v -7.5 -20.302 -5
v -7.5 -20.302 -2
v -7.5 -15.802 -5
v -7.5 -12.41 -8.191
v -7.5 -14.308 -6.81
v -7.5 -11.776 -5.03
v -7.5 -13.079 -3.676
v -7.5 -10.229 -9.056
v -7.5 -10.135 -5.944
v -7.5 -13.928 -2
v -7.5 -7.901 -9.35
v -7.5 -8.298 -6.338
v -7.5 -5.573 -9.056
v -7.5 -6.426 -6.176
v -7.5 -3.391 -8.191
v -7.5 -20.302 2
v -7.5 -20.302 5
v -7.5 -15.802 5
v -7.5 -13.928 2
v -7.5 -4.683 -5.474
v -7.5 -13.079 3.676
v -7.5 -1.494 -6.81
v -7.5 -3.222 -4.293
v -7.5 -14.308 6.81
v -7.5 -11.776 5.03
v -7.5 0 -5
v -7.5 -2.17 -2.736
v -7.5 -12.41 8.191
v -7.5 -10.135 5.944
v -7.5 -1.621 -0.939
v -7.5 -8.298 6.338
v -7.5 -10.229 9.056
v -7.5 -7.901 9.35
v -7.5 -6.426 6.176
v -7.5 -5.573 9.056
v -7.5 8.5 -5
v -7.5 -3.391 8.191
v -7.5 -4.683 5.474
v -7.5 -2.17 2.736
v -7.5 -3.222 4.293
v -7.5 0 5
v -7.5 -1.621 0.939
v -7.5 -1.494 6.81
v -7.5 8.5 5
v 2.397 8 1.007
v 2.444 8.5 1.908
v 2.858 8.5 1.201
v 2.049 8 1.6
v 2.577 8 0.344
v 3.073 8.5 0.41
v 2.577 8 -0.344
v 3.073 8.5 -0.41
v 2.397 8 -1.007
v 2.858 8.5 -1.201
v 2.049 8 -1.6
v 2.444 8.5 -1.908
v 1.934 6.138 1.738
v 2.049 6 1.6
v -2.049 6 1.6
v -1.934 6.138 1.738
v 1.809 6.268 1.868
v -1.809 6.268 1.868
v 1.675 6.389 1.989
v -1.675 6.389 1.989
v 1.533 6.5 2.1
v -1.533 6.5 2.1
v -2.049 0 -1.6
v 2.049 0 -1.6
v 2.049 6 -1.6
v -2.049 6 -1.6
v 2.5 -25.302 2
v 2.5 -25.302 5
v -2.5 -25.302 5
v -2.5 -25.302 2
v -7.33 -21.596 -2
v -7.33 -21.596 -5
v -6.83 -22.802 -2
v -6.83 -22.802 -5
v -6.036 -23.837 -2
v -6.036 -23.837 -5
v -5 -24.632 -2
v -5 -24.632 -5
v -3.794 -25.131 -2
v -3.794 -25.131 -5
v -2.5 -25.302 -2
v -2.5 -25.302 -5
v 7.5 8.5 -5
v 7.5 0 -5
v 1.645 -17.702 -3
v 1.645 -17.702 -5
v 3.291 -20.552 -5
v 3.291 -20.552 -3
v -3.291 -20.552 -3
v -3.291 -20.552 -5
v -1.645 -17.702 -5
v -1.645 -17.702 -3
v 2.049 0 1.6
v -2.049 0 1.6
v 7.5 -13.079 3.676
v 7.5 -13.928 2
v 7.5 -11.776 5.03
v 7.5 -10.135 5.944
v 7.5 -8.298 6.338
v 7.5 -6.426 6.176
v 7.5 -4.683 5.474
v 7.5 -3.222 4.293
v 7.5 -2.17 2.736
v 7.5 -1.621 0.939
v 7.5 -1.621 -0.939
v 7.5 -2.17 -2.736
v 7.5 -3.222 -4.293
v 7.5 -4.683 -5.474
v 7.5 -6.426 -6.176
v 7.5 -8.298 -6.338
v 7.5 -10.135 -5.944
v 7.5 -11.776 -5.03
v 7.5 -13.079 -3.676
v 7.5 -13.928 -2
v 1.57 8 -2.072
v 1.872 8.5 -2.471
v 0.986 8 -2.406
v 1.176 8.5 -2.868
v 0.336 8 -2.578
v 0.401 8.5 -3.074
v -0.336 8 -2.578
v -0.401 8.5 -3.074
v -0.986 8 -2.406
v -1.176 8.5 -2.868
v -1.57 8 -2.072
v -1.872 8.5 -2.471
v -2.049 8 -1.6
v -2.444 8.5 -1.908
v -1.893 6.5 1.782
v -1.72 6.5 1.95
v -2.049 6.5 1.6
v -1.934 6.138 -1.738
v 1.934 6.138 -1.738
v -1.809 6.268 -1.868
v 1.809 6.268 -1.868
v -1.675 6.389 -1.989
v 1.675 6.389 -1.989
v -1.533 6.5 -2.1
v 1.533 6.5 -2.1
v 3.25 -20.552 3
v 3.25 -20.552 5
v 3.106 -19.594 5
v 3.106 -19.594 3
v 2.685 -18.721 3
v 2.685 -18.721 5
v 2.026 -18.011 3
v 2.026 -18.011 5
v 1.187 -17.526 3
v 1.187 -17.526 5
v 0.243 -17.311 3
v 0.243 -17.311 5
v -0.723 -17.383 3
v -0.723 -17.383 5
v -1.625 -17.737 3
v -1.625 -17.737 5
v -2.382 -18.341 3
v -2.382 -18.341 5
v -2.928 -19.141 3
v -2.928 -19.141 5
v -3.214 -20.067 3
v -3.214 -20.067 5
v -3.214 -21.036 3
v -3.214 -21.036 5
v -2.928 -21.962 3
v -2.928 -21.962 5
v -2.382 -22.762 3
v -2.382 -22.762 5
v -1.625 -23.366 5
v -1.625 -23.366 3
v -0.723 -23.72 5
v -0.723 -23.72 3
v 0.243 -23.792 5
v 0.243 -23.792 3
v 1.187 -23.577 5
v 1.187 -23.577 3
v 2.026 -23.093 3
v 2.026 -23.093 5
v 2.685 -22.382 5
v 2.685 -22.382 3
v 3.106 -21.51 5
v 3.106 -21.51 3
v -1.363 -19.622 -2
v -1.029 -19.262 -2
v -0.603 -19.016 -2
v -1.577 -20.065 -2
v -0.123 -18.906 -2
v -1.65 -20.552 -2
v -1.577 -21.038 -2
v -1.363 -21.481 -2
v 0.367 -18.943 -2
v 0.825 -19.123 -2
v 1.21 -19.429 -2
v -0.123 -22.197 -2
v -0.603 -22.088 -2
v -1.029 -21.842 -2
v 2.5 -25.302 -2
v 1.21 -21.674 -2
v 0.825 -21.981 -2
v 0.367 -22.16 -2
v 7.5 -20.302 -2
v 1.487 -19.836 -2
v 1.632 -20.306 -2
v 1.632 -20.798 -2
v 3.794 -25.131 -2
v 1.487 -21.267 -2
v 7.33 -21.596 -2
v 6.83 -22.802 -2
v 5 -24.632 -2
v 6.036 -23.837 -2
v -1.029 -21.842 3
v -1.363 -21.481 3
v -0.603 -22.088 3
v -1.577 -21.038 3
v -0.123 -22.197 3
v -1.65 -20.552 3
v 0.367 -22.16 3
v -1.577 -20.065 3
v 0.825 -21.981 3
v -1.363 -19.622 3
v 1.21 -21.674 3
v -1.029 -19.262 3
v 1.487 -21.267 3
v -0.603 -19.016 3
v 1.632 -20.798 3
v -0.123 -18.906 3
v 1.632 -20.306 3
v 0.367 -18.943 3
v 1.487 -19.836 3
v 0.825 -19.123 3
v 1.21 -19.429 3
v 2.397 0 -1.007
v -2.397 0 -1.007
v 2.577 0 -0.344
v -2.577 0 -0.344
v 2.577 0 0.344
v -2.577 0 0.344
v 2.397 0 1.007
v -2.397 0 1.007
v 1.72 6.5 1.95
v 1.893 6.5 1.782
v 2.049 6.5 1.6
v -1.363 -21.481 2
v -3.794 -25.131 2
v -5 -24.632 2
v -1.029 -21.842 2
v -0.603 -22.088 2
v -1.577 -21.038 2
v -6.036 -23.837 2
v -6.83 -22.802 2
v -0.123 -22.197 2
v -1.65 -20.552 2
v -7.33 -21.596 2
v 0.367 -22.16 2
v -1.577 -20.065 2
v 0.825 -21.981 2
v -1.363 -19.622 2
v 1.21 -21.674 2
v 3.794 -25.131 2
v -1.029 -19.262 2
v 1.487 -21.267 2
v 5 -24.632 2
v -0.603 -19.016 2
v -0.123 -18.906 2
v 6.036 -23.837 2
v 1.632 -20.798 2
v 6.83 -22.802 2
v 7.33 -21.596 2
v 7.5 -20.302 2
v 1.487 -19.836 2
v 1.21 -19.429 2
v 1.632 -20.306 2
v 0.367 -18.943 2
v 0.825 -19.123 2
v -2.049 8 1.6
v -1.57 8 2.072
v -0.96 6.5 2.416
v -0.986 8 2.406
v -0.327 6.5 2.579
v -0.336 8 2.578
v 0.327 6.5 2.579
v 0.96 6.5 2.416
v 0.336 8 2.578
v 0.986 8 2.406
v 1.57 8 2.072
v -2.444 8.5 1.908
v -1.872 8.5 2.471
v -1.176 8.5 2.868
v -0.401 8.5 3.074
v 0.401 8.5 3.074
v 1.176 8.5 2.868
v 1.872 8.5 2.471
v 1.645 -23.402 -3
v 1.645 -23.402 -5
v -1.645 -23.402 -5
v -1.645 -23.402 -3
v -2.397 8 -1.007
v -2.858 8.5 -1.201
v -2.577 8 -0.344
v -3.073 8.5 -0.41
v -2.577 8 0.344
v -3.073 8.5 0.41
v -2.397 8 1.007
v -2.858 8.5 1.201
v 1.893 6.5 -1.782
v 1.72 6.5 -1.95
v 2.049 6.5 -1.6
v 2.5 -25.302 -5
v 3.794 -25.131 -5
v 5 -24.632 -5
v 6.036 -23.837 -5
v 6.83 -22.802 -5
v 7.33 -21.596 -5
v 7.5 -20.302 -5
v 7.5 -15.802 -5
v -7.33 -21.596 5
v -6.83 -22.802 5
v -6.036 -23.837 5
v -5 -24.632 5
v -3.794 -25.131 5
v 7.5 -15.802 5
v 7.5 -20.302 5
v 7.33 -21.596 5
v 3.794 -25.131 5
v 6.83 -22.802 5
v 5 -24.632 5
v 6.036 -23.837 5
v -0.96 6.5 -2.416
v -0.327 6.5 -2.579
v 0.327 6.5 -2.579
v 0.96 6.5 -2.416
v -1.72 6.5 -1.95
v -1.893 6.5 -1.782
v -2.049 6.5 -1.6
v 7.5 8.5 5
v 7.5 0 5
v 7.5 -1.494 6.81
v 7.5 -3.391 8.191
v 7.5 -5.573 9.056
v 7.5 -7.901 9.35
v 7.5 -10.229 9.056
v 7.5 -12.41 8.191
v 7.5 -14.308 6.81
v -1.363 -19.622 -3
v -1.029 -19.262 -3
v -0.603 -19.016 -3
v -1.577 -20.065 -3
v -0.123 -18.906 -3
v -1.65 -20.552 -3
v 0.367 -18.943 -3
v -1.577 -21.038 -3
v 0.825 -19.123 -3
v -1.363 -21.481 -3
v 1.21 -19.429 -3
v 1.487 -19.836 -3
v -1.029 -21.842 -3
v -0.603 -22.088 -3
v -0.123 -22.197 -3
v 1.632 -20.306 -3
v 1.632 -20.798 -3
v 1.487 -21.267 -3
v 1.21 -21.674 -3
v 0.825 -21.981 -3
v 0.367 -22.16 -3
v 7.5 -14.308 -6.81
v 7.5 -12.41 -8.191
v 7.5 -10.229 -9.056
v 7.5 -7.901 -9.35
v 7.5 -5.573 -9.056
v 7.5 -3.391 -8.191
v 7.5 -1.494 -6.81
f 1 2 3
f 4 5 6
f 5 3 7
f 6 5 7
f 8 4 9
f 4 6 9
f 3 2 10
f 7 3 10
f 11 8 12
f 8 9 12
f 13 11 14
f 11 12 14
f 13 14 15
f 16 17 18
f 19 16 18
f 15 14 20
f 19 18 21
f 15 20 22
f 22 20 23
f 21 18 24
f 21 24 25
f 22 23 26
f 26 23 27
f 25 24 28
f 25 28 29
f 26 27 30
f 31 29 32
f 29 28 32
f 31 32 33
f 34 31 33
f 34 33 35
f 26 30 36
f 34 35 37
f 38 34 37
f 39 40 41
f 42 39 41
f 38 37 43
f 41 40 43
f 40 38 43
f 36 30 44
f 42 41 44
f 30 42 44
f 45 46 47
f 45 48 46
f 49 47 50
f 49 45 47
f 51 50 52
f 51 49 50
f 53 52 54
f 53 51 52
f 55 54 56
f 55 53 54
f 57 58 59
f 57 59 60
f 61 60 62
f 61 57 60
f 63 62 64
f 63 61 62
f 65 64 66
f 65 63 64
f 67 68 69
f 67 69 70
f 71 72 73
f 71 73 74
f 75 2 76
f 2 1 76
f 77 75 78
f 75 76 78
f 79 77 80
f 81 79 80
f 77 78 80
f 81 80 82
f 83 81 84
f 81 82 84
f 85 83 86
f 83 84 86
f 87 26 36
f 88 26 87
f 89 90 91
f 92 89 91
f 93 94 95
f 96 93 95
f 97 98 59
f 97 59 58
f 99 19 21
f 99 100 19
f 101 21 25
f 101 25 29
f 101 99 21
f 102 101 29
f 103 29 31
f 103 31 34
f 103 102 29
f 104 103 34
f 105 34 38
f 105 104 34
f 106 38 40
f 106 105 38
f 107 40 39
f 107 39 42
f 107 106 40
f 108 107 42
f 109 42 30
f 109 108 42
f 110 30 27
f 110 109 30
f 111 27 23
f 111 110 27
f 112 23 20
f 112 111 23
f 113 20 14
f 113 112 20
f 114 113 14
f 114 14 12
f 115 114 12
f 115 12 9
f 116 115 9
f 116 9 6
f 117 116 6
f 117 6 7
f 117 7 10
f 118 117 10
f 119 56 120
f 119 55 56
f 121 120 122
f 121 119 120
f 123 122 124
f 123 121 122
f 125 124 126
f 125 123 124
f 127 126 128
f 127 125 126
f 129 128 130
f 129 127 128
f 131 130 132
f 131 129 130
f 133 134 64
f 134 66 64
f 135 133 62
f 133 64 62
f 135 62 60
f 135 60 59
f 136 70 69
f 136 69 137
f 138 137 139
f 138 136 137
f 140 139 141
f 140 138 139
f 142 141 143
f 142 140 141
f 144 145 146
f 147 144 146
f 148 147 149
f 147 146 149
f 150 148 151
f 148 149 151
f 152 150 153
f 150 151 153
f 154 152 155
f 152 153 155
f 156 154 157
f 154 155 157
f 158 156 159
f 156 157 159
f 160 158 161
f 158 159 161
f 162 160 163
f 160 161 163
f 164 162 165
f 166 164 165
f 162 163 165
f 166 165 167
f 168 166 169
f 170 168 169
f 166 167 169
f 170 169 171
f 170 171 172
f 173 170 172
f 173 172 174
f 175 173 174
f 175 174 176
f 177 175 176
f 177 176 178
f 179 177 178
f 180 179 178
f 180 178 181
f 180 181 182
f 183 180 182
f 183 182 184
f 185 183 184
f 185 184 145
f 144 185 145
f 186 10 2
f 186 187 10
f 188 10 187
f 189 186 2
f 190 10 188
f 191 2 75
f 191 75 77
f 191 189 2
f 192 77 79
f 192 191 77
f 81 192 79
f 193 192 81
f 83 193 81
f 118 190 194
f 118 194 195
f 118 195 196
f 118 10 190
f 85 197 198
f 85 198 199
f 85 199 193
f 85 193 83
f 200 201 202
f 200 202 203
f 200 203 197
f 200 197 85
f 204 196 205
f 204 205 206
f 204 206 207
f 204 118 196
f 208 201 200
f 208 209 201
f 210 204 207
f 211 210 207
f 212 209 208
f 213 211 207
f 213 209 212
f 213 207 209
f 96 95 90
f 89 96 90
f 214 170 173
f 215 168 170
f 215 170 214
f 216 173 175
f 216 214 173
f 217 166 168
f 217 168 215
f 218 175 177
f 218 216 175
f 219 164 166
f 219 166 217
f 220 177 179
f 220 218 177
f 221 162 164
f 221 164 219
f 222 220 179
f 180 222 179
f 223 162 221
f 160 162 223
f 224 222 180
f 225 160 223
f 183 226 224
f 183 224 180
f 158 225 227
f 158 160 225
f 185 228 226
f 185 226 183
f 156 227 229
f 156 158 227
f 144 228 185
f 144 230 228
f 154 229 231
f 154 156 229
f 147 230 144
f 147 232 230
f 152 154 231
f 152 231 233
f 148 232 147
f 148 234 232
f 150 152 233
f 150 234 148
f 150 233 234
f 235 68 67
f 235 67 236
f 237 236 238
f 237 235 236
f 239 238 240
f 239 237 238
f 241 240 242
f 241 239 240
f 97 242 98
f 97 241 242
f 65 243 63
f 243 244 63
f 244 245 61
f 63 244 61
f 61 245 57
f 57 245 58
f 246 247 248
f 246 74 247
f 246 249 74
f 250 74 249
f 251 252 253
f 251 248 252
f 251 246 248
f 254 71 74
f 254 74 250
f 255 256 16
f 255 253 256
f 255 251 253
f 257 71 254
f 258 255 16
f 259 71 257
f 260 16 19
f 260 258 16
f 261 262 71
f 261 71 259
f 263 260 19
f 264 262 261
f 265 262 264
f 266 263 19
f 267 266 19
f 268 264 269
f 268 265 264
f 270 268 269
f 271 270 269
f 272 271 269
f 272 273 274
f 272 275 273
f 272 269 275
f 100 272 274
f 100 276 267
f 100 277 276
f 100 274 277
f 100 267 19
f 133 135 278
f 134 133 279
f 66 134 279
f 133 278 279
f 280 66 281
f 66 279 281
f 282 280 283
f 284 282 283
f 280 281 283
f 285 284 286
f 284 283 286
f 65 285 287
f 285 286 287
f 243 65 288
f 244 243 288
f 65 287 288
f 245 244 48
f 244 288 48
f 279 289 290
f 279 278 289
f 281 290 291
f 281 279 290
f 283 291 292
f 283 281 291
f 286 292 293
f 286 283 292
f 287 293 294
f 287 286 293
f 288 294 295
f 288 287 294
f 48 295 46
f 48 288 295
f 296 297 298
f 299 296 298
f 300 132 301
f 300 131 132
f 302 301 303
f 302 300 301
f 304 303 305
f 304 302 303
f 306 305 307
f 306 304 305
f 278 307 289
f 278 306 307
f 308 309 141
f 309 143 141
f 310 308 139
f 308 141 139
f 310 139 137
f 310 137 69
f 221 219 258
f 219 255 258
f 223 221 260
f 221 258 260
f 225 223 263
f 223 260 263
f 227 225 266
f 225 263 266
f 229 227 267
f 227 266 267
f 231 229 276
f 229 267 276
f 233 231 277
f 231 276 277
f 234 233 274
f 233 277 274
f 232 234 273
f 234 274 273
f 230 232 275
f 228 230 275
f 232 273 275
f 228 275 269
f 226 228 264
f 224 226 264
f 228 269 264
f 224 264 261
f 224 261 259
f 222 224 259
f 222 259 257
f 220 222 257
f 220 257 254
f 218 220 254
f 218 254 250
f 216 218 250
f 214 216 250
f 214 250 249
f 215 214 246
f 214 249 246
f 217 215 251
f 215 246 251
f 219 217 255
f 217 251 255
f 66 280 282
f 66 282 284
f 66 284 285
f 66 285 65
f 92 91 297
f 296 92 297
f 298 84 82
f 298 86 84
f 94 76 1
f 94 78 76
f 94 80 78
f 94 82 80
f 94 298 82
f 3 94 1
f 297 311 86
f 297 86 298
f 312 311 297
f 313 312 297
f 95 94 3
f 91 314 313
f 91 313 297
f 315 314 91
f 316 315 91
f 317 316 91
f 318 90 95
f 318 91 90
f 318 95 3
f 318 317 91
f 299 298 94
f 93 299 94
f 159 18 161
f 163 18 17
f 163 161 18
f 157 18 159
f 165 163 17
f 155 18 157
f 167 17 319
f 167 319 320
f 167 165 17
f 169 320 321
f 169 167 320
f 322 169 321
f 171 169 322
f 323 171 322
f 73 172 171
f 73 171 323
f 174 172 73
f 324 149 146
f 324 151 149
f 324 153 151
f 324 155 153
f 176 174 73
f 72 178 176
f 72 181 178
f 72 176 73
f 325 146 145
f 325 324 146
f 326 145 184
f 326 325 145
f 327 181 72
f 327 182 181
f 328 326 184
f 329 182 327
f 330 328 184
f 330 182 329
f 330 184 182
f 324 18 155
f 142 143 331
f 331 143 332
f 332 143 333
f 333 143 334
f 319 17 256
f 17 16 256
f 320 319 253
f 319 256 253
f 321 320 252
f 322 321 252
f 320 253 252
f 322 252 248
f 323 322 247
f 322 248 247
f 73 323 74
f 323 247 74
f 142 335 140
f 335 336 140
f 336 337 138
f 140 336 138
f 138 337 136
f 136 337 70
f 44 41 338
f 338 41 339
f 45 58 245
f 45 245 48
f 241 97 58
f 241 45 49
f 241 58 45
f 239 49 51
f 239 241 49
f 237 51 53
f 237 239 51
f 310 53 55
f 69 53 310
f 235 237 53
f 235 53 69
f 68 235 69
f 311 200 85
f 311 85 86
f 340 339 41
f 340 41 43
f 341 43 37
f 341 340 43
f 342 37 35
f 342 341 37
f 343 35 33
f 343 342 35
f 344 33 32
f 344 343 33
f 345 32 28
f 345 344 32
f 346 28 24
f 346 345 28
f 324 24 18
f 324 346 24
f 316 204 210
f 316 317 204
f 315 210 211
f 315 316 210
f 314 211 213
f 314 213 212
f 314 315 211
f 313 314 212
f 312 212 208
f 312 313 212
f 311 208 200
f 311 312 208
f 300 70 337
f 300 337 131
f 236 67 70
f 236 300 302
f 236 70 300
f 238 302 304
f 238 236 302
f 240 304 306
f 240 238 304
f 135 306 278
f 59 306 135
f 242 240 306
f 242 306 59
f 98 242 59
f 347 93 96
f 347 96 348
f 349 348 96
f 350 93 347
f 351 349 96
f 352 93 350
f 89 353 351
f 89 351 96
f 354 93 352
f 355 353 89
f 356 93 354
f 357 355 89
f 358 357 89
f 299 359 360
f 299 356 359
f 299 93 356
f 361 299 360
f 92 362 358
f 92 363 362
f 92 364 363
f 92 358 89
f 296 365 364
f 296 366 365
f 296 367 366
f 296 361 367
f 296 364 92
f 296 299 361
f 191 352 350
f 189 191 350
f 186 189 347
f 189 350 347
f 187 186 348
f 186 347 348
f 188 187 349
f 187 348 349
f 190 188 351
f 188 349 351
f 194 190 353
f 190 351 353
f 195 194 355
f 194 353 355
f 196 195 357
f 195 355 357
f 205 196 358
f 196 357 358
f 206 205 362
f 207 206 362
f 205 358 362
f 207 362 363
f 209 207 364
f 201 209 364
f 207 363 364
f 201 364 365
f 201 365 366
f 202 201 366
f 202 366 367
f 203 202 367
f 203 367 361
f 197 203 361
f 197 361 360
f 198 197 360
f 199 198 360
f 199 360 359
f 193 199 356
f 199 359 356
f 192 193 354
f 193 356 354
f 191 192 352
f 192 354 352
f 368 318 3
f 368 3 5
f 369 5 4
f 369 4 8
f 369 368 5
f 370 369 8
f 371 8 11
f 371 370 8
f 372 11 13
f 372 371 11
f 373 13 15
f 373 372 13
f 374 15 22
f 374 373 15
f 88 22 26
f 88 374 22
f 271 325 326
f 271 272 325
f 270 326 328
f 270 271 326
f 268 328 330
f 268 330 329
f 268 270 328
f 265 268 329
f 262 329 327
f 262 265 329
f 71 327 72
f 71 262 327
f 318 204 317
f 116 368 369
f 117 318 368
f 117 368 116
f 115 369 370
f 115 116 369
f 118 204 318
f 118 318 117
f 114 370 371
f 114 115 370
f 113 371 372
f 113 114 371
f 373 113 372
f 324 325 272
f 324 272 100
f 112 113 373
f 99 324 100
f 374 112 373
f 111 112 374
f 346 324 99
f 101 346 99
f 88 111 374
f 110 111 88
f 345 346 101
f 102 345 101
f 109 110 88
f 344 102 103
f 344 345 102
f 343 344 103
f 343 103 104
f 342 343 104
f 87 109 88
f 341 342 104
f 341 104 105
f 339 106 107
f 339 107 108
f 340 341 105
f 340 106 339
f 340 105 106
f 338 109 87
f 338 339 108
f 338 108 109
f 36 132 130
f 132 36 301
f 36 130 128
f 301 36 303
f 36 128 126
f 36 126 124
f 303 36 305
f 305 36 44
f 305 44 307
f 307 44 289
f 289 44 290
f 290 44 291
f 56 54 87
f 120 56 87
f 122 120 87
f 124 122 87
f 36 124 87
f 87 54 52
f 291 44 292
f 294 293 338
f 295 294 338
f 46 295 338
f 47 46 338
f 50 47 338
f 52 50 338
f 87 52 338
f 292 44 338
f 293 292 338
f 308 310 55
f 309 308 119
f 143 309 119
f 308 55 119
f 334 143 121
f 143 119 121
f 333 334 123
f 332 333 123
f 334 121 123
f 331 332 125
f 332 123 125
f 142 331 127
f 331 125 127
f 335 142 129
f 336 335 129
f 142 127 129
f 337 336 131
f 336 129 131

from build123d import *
from build123d import SkipClean  # not in build123d's __all__

# Parameters (mm, degrees)
F0_W           = 15
F0_H           = 10
F1_DEPTH       = 8.5
F3_DEPTH       = 7.5
F5_D           = 3.3
F5_CBORE_D     = 6.5
F5_CBORE_DEPTH = 2
F7_DEPTH       = 2
F8_R           = 5
F10_DEPTH      = 2
F11_T3_DEPTH   = 6.6704632943
F11_S4_R       = 2.6
F11_T5_DEPTH   = 5
F11_T8_DEPTH   = 6.6704632943
F11_S9_R       = 2.6
F11_T10_DEPTH  = 5
F11_T13_ANGLE  = 75.9597448897
F11_T16_ANGLE  = 75.9597448897
F11_T19_ANGLE  = 104.0402551103
F11_T22_ANGLE  = 104.0402551103


# Not quite as in the source:
# - a fillet or chamfer that OpenCascade refuses, or shapes differently, is made with other operations: its cross-section is extruded or revolved along the edge and cut away or added


with BuildPart() as f1:
    # F0 (on Front) → F1 (new body)
    with BuildSketch(Plane.XZ):
        Rectangle(F0_W, F0_H)
        with BuildLine():
            ThreePointArc((-2.0493901532, -1.6), (-2.6, 0), (-2.0493901532, 1.6))
            Line((-2.0493901532, 1.6), (2.0493901532, 1.6))
            ThreePointArc((2.0493901532, 1.6), (2.6, 0), (2.0493901532, -1.6))
            Line((2.0493901532, -1.6), (-2.0493901532, -1.6))
        make_face(mode=Mode.SUBTRACT)
    extrude(amount=-F1_DEPTH)

    # F2 (on Right) → F3 (join, symmetric)
    with BuildSketch(Plane.YZ):
        with BuildLine():
            ThreePointArc((-13.9276061789, 2), (-1.5507910996, 0), (-13.9276061789, -2))
            Line((-13.9276061789, -2), (-25.3015821993, -2))
            Line((-25.3015821993, -2), (-25.3015821993, -5))
            Line((-25.3015821993, -5), (-15.8015821993, -5))
            ThreePointArc((-15.8015821993, -5), (-7.9007910996, -9.35), (0, -5))
            Line((0, -5), (0, 5))
            ThreePointArc((0, 5), (-7.9007910996, 9.35), (-15.8015821993, 5))
            Line((-15.8015821993, 5), (-25.3015821993, 5))
            Line((-25.3015821993, 5), (-25.3015821993, 2))
            Line((-25.3015821993, 2), (-13.9276061789, 2))
        make_face()
    extrude(amount=F3_DEPTH, both=True)

    # F5 (through all)
    with Locations(Plane.XY.offset(5)):
        with Locations((0, -20.5515821993)):
            CounterBoreHole(F5_D / 2, F5_CBORE_D / 2, F5_CBORE_DEPTH)

    # F6 (on face) → F7 (cut)
    with BuildSketch(Plane(origin=(0, 0, -5), x_dir=(1, 0, 0), z_dir=(0, 0, -1))):
        Polygon((-1.6454482672, 17.7015821993), (1.6454482672, 17.7015821993), (3.2908965344, 20.5515821993), (1.6454482672, 23.4015821993), (-1.6454482672, 23.4015821993), (-3.2908965344, 20.5515821993), align=None)
    extrude(amount=-F7_DEPTH, mode=Mode.SUBTRACT)

    # F8
    f8_edges = [f1.edges().sort_by_distance(p)[0] for p in [
        (7.5, -25.301582, 3.5),
        (-7.5, -25.301582, 3.5),
        (-7.5, -25.301582, -3.5),
        (7.5, -25.301582, -3.5),
    ]]
    fillet(f8_edges, radius=F8_R)

    # F9 (on face) → F10 (cut)
    with BuildSketch(Plane(origin=(0, 8.5, 0), x_dir=(-1, 0, 0), z_dir=(0, 1, 0))):
        with BuildLine():
            Line((-2.0493901532, 1.6), (2.0493901532, 1.6))
            ThreePointArc((2.0493901532, 1.6), (0, 2.6), (-2.0493901532, 1.6))
        make_face()
        with BuildLine():
            ThreePointArc((-2.0493901532, -1.6), (0, -2.6), (2.0493901532, -1.6))
            Line((2.0493901532, -1.6), (-2.0493901532, -1.6))
        make_face()
    with SkipClean():  # cleaning this boolean's faces spoils the solid; the shape is the same uncleaned
        extrude(amount=-F10_DEPTH, mode=Mode.SUBTRACT)

    # F11: chamfer of 0.5 on 6 edges, made by hand


with BuildPart() as f11_tool1:
    # F11_s2 → F11_t3 (new body)
    with BuildSketch(Plane.YZ.offset(3.3352316472)):
        Polygon((6, 1.6), (6.5, 2.1), (6.5, 1.6), align=None)
    extrude(amount=-F11_T3_DEPTH)

    # F11_s4 → F11_t5 (intersect, symmetric)
    with BuildSketch(Plane.XZ.offset(-6.2)):
        Circle(F11_S4_R)
    extrude(amount=F11_T5_DEPTH, both=True, mode=Mode.INTERSECT)


with BuildPart() as f11_tool6:
    # F11_s7 → F11_t8 (new body)
    with BuildSketch(Plane.YZ.offset(-3.3352316472)):
        Polygon((6, -1.6), (6.5, -2.1), (6.5, -1.6), align=None)
    extrude(amount=F11_T8_DEPTH)

    # F11_s9 → F11_t10 (intersect, symmetric)
    with BuildSketch(Plane.XZ.offset(-6.2)):
        Circle(F11_S9_R)
    extrude(amount=F11_T10_DEPTH, both=True, mode=Mode.INTERSECT)


with BuildPart() as f11_tool11:
    # F11_s12 → F11_t13 (revolve)
    with BuildSketch(Plane(origin=(0, 0, 0), x_dir=(0, 1, 0), z_dir=(0.6153846154, 0, -0.788226982))):
        Polygon((8.5, -3.1), (8, -2.6), (8.5, -2.6), align=None)
    revolve(axis=Axis((0, 8.5, 0), (0, 1, 0)), revolution_arc=F11_T13_ANGLE)


with BuildPart() as f11_tool14:
    # F11_s15 → F11_t16 (revolve)
    with BuildSketch(Plane(origin=(0, 0, 0), x_dir=(0, 1, 0), z_dir=(-0.6153846154, 0, 0.788226982))):
        Polygon((8.5, -3.1), (8, -2.6), (8.5, -2.6), align=None)
    revolve(axis=Axis((0, 8.5, 0), (0, 1, 0)), revolution_arc=F11_T16_ANGLE)


with BuildPart() as f11_tool17:
    # F11_s18 → F11_t19 (revolve)
    with BuildSketch(Plane(origin=(0, 0, 0), x_dir=(0, 1, 0), z_dir=(-0.6153846154, 0, -0.788226982))):
        Polygon((8.5, -3.1), (8, -2.6), (8.5, -2.6), align=None)
    revolve(axis=Axis((0, 8.5, 0), (0, 1, 0)), revolution_arc=F11_T19_ANGLE)


with BuildPart() as f11_tool20:
    # F11_s21 → F11_t22 (revolve)
    with BuildSketch(Plane(origin=(0, 0, 0), x_dir=(0, 1, 0), z_dir=(0.6153846154, 0, 0.788226982))):
        Polygon((8.5, -3.1), (8, -2.6), (8.5, -2.6), align=None)
    revolve(axis=Axis((0, 8.5, 0), (0, 1, 0)), revolution_arc=F11_T22_ANGLE)


with BuildPart() as f1_1:
    add(f1.part, clean=False)

    # F11_t23: cut F11_tool1, F11_tool6, F11_tool11, F11_tool14, F11_tool17, F11_tool20
    add([f11_tool1.part, f11_tool6.part, f11_tool11.part, f11_tool14.part, f11_tool17.part, f11_tool20.part], mode=Mode.SUBTRACT)


solid = f1_1.part
